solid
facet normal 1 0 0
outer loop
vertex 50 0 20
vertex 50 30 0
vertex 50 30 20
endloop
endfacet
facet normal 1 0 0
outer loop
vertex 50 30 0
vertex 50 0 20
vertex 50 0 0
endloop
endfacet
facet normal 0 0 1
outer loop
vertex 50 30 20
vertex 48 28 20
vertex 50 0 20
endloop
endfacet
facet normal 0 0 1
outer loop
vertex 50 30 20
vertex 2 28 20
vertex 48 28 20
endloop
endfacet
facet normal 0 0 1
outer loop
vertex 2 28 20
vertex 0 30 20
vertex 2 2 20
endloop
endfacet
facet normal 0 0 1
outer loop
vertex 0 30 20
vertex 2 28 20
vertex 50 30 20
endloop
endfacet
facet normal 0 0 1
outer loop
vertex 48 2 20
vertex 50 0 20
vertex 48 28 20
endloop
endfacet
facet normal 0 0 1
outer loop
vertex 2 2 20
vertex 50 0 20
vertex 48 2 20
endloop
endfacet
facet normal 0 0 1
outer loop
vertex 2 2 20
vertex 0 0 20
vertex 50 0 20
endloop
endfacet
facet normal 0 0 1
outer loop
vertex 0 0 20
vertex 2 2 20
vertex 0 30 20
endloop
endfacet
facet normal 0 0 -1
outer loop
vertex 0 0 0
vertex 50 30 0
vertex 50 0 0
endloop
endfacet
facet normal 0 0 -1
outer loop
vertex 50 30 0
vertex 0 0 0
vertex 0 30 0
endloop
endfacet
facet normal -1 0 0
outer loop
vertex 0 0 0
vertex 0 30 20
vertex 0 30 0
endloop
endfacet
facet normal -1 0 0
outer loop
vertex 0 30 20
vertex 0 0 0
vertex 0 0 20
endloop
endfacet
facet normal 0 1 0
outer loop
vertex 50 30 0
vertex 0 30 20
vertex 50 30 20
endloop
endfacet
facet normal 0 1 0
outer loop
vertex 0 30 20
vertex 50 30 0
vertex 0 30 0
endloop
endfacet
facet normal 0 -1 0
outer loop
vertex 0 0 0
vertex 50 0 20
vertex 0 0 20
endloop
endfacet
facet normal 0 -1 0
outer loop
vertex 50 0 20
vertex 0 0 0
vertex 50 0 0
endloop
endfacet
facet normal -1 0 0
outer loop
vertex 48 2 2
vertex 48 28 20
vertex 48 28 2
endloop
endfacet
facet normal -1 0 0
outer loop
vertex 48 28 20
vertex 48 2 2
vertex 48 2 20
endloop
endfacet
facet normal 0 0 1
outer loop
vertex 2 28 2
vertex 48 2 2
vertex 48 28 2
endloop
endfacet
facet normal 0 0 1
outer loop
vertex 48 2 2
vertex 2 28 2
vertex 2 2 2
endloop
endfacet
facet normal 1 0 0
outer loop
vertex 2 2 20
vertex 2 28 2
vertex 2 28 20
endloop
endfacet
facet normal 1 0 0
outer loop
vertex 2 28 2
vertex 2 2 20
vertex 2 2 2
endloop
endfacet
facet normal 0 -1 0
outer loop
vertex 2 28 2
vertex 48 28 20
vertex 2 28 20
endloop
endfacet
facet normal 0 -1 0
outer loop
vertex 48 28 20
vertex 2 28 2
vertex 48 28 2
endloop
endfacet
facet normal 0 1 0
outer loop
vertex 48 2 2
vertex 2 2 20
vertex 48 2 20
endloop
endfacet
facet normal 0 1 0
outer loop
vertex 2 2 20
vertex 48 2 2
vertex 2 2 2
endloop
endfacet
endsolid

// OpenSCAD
difference() {
  cube([50, 30, 20]);
  translate([2, 2, 2]) cube([46, 26, 20]);
}
